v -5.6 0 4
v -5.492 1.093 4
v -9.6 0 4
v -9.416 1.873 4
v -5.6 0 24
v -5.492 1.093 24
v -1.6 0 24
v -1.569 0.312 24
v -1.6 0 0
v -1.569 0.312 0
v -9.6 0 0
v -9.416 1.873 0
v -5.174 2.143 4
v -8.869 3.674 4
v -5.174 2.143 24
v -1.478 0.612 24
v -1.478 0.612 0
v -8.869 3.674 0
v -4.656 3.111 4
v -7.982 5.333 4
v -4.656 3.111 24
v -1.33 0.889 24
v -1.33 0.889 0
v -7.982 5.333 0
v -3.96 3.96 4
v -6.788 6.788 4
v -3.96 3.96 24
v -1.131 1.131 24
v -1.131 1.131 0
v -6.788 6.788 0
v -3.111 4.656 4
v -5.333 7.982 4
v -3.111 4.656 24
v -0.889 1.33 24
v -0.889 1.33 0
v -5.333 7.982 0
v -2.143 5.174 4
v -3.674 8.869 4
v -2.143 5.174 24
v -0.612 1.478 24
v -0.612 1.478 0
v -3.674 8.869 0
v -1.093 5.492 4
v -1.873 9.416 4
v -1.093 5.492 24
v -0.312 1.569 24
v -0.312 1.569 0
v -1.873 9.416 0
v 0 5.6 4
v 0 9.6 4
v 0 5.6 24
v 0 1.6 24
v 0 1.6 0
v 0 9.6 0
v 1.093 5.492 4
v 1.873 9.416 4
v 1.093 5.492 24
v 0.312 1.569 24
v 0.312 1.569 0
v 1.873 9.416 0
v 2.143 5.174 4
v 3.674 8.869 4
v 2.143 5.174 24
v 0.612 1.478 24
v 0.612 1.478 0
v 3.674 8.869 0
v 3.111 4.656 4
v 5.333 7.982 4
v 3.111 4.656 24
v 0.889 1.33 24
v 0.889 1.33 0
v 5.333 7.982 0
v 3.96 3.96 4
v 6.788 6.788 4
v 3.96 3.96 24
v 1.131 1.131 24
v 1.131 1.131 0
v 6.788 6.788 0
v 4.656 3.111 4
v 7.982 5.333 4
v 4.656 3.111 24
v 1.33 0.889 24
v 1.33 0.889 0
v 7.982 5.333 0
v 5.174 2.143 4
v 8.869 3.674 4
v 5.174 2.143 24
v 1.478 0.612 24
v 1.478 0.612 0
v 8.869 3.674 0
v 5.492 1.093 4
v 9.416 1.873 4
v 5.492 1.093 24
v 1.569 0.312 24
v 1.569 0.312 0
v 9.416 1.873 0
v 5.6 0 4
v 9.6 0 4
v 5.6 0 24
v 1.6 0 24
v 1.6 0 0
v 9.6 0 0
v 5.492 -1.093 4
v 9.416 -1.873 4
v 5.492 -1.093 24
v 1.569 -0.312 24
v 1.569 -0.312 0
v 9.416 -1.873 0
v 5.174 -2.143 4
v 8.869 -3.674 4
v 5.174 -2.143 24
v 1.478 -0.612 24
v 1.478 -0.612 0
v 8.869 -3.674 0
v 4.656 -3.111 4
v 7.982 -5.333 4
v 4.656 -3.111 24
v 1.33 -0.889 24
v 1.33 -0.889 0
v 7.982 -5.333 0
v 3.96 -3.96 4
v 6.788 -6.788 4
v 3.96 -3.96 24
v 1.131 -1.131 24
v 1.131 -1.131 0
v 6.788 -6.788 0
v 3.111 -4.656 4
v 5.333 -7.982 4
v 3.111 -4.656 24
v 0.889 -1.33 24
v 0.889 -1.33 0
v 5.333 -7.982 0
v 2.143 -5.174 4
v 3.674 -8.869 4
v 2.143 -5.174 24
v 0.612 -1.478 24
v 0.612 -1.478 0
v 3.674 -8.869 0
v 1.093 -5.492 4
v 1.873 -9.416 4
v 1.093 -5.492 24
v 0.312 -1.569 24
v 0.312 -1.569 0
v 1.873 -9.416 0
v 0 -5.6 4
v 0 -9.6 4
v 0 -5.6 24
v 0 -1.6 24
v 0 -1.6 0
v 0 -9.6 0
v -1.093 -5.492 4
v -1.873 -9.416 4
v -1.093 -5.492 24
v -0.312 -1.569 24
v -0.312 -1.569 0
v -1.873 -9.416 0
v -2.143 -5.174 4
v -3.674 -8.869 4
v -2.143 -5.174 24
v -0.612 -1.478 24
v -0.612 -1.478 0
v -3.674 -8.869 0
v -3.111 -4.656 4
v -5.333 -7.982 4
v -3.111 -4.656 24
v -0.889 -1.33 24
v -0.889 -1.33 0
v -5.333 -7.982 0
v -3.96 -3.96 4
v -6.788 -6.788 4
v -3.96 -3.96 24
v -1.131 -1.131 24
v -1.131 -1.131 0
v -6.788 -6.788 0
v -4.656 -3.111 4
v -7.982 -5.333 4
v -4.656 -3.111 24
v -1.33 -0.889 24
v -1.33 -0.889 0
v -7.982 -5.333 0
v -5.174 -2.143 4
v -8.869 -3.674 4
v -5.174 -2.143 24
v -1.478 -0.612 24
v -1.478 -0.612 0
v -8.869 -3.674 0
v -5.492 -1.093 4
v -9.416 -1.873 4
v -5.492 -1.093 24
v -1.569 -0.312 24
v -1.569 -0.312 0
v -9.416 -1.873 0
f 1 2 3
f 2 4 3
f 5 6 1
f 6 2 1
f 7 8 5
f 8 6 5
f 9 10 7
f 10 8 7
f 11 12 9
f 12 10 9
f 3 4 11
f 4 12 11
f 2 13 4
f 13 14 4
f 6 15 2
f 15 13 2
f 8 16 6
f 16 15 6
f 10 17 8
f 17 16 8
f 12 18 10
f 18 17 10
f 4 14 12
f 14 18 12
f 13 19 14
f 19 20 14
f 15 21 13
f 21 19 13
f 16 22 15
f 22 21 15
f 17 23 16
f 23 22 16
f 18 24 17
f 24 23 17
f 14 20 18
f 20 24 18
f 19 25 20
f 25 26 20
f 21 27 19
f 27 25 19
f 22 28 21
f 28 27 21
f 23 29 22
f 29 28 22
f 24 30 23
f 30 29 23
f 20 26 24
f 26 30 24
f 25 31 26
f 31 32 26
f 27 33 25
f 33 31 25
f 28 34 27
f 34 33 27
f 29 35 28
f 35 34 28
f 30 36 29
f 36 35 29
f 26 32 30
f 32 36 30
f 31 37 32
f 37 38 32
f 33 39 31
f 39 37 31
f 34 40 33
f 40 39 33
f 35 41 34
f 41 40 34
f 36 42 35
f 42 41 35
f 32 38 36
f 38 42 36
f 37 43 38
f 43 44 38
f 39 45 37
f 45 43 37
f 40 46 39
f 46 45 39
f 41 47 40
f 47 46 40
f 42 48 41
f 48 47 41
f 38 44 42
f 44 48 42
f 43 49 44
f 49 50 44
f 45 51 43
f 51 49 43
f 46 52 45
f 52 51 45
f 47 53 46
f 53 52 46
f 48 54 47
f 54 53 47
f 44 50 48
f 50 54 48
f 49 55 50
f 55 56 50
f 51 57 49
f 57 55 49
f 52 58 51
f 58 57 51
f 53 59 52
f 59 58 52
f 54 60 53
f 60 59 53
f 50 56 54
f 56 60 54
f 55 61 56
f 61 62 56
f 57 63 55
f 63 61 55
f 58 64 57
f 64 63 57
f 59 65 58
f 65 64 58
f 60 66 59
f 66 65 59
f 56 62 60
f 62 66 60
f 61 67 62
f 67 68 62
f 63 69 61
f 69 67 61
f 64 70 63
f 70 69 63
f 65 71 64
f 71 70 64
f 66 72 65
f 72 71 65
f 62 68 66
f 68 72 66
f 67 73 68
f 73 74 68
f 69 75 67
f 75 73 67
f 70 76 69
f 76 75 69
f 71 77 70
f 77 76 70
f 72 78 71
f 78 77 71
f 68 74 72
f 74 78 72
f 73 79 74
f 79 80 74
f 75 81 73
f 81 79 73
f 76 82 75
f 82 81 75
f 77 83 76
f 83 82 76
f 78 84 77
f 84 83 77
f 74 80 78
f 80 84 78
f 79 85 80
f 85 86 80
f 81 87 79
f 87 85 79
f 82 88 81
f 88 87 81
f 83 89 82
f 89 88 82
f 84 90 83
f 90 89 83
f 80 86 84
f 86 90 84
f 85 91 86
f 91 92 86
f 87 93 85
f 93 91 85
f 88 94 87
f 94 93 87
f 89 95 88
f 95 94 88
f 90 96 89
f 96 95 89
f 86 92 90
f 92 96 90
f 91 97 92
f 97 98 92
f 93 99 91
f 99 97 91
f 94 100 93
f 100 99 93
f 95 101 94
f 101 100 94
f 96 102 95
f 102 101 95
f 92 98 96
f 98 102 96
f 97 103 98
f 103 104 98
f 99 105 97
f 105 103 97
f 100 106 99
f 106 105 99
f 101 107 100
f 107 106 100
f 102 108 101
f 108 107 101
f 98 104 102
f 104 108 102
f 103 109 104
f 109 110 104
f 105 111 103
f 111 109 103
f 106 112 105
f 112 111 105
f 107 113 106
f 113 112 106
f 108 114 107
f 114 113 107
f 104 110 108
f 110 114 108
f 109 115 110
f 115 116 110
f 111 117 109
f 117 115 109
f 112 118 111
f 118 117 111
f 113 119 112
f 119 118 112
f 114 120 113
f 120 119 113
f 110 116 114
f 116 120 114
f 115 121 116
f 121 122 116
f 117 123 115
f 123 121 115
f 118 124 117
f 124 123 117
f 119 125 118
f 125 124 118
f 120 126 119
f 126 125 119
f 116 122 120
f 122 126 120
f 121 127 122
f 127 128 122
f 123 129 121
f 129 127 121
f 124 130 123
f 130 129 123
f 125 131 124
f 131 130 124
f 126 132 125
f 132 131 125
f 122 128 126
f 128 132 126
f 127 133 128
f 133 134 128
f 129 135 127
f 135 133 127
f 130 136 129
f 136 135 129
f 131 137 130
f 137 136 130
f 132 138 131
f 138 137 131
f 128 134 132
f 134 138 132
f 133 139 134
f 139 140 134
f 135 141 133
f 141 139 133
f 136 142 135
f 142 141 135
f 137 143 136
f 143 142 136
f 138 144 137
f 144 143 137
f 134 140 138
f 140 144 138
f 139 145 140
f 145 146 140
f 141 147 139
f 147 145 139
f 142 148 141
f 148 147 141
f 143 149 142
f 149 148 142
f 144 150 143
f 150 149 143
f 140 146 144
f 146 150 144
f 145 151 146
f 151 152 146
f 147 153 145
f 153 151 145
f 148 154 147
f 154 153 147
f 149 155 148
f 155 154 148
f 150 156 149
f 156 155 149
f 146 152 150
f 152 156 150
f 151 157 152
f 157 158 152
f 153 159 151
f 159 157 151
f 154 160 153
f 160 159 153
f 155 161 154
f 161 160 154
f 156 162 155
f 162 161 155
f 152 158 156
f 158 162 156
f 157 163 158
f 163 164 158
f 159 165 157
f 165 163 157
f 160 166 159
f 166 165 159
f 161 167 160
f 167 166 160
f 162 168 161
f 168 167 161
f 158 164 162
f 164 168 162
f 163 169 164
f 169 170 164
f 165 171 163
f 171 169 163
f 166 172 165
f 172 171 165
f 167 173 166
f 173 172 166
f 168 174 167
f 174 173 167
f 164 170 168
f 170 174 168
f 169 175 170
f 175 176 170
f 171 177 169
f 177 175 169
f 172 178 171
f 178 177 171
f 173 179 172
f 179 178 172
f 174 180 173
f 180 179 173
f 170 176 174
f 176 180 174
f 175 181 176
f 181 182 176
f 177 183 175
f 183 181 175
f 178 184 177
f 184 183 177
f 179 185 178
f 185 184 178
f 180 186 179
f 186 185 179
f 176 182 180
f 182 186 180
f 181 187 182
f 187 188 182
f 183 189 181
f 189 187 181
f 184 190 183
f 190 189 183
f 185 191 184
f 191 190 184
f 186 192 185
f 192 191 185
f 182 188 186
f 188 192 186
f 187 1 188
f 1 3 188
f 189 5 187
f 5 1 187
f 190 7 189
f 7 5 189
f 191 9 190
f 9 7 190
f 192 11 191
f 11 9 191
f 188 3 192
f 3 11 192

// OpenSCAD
$fn = 32;

// ----------------------------------------------------------------------
// Profiled standoff: flanged spacer, 24 mm long, bore 3.2 mm
// ----------------------------------------------------------------------

// --- parameters (mm) ---
revolve_angle = 360;      // full turn around the Z axis
profile_points = 6;       // points of the closed outline

profile = [[1.6, 0], [9.6, 0], [9.6, 4], [5.6, 4], [5.6, 24], [1.6, 24]];  // single closed polygon, 6 points, counter clockwise

// --- the one profile operation ---
rotate_extrude(angle = revolve_angle) polygon(points = profile);
